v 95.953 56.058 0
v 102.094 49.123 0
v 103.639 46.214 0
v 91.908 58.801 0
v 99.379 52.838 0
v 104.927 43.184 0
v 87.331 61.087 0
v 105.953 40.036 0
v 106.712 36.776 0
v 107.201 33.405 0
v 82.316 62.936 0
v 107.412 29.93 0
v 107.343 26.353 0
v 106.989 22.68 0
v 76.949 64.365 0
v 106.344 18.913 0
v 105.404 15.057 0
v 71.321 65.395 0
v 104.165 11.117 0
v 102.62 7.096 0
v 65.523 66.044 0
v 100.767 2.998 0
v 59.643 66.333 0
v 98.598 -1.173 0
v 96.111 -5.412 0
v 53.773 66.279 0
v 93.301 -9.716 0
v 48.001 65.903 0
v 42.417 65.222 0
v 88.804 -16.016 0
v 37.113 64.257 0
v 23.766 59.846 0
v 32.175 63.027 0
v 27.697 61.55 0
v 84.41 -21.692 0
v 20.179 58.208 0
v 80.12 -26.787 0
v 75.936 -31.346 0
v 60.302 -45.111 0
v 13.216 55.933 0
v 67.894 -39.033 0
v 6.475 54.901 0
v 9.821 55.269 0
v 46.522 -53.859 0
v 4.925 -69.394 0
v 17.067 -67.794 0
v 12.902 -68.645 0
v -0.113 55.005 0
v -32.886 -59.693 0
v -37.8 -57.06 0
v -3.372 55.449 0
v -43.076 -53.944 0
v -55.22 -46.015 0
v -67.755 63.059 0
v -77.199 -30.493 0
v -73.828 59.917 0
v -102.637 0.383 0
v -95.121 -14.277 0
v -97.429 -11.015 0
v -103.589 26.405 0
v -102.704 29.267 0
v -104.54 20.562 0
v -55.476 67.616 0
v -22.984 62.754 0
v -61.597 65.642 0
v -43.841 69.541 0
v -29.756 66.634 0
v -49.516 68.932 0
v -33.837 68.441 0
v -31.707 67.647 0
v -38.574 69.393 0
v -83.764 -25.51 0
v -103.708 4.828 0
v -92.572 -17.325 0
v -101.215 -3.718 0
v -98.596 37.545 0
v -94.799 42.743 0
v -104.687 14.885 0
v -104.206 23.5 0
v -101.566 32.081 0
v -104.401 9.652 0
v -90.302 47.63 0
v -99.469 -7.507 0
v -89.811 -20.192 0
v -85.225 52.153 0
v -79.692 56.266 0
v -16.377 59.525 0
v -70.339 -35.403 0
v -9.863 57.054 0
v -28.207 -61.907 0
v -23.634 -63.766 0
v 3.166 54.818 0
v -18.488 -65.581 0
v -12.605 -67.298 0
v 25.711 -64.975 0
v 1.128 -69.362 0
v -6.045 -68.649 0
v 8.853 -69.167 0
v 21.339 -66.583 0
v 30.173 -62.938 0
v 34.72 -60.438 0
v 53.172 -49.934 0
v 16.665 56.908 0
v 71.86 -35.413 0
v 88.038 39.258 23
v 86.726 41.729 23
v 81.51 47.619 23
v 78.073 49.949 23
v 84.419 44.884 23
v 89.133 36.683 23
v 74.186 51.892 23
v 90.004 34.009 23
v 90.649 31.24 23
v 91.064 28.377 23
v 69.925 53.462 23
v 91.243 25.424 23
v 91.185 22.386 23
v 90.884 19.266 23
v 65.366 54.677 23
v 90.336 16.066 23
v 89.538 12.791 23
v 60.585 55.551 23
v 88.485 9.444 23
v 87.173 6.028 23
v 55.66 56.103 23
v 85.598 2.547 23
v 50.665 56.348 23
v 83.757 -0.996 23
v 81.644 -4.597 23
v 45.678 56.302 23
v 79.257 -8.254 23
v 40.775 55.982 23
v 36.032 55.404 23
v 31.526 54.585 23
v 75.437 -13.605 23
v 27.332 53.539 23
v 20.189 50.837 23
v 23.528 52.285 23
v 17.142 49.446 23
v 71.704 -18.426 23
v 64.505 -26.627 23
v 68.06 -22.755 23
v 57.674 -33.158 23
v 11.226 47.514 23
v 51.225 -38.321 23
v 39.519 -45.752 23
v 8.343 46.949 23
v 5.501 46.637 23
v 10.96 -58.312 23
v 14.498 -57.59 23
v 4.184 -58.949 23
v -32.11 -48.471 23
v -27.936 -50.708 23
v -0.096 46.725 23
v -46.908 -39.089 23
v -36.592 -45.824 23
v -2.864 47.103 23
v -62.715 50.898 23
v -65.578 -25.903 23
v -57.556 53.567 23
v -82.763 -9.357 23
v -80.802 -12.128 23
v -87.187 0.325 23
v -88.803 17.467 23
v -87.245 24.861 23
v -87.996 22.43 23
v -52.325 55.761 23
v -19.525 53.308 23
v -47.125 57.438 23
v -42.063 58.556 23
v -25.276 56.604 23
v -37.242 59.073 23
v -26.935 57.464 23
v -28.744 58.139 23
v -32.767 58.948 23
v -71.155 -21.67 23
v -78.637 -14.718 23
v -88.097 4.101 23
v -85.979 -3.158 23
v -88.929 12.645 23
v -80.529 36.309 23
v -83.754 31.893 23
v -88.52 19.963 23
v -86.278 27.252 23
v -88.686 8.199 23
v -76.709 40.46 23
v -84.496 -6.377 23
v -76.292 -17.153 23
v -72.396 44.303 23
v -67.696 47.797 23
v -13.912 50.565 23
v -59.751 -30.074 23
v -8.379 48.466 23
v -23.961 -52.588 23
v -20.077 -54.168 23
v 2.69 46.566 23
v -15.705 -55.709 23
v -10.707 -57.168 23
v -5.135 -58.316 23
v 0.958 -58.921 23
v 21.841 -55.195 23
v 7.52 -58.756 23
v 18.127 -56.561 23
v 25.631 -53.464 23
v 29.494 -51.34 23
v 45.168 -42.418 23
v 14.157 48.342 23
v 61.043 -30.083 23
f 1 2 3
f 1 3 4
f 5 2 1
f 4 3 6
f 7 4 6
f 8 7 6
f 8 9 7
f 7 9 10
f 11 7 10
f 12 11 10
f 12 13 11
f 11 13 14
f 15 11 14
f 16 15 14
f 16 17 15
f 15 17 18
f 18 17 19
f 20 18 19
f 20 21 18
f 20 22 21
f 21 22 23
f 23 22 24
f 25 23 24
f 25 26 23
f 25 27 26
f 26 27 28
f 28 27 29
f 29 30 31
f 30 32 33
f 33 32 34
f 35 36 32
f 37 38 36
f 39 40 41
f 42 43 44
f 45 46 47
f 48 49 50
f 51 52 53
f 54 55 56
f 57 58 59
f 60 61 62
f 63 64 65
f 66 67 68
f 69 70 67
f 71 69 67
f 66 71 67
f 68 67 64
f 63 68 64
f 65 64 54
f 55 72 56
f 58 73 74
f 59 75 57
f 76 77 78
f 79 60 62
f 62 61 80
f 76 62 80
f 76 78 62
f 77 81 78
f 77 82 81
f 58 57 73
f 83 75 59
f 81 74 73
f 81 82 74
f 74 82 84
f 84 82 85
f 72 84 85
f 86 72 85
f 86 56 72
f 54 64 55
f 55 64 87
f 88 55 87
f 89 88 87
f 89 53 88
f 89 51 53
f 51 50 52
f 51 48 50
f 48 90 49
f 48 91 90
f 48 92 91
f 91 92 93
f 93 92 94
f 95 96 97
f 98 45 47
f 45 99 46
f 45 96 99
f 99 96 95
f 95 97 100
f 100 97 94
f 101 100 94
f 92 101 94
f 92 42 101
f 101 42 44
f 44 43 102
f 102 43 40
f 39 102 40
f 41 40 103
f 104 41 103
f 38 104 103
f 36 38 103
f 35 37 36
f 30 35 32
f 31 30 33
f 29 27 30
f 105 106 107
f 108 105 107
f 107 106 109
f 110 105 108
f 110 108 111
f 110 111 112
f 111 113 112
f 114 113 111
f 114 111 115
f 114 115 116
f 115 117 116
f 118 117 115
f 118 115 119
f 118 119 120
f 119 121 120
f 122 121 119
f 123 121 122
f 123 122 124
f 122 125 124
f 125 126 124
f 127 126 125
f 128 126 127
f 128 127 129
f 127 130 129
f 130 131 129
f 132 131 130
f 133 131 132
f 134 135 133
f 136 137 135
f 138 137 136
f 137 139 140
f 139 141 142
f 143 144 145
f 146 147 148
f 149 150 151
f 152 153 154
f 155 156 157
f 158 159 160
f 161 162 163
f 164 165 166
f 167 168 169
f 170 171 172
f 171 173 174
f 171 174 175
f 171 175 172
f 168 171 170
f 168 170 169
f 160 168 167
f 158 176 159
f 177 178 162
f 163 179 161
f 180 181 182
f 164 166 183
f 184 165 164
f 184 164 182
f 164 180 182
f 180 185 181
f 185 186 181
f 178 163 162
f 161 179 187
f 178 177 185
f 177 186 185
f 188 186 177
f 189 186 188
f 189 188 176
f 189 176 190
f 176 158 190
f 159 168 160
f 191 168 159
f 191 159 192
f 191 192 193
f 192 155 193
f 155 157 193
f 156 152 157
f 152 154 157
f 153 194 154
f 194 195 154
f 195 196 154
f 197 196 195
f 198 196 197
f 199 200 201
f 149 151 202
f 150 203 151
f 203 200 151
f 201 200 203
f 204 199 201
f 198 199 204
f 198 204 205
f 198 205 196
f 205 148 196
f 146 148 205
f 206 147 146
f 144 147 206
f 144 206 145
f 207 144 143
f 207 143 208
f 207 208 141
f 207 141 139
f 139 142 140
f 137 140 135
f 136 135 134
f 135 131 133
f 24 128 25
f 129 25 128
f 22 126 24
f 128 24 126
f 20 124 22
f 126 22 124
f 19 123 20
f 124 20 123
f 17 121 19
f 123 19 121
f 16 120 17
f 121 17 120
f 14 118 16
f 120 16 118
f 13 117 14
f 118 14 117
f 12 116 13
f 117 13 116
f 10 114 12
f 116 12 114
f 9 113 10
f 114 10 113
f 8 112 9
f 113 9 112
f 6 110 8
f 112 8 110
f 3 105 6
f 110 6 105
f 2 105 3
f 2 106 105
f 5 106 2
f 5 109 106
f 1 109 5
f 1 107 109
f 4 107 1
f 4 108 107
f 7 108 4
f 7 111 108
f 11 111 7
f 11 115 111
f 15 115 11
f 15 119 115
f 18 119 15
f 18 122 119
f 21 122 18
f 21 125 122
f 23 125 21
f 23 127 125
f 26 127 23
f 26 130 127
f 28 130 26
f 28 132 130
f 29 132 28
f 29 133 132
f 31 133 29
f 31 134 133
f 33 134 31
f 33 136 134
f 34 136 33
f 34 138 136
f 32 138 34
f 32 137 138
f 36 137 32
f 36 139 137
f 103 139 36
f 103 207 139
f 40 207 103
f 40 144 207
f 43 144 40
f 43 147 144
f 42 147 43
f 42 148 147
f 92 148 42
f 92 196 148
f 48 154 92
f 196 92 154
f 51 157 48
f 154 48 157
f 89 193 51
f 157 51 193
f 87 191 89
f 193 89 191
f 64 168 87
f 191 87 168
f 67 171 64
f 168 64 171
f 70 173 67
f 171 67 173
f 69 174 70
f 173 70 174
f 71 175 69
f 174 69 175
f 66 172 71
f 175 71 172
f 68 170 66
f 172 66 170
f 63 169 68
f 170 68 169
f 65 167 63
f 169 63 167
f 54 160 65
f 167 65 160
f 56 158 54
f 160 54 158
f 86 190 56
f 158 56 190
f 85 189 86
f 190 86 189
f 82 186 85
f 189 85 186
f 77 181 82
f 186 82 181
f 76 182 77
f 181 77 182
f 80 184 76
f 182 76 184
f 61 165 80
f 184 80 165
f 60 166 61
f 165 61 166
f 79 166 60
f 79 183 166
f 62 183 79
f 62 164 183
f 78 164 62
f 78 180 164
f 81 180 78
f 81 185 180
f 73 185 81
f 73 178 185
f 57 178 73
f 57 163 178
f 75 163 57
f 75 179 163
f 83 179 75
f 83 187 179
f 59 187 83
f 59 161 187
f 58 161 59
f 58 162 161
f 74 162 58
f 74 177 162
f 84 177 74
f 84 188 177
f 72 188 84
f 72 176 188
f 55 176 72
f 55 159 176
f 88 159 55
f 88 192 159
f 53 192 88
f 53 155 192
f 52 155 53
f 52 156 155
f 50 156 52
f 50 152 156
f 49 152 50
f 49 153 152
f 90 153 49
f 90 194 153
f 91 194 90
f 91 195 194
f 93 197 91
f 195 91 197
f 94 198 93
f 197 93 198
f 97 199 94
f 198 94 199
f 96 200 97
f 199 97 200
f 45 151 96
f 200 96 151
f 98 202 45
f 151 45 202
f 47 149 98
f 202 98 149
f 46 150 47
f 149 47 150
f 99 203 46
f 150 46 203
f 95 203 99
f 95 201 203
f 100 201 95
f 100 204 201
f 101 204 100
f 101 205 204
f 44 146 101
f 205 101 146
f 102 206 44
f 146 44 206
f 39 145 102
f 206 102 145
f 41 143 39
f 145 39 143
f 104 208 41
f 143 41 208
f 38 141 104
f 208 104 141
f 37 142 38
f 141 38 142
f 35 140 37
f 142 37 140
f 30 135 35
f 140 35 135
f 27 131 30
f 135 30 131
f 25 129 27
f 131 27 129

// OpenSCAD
// file: hillpolygon.scad
module hillFromPolygon(height = 23, angle = 30, convexity = 5) {
   $fn = 100;

   // estRadius calculates an estimated radius for the hill assuming that I've filled most of the
   // depth of the build plate (Y dimension) with the polygon. This is then used to scale the roof of
   // the polyhedral.
   estRadius = 0.95 * 150 / 2;
   inset = height * tan(angle);
   scaleFactor = (estRadius - inset) / estRadius;

   linear_extrude(height = height, convexity = convexity, scale=scaleFactor) child(0);
}
// main file
use <hillpolygon.scad>

% translate([0,0,155/2]) cube(size=[240, 153, 155], center=true); 

hill4();

module hill4() {
   hillFromPolygon(angle=25) hill4Polygon();
}

// Note: There is something slightly amiss with this polygon, resulting hill ends up with two
//       volumes (?).
module hill4Polygon() {
   // Apologies for the hackish adjustments ... just wanted to get the job done!
   translate([-10,0,0]) rotate([0,0,55]) translate([75,-10,0]) scale([0.8,0.8]) 
      polygon(points=
         [[-140.478, 124.045], [-137.230, 125.810], [-133.814, 127.261],
         [-130.249, 128.407], [-126.551, 129.260], [-118.827, 130.135],
         [-110.782, 129.975], [-102.554, 128.873], [-94.282, 126.918],
         [-86.104, 124.202], [-78.161, 120.815], [-70.590, 116.849],
         [-63.530, 112.395], [-57.120, 107.543], [-51.500, 102.384],
         [-46.807, 97.010], [-43.182, 91.511], [-40.761, 85.978], [-40.047,
         83.228], [-39.685, 80.503], [-38.803, 70.788], [-37.372, 61.707],
         [-35.232, 53.266], [-32.221, 45.469], [-30.339, 41.813], [-28.180,
         38.321], [-25.722, 34.993], [-22.947, 31.830], [-19.833, 28.831],
         [-16.361, 25.998], [-12.511, 23.332], [-8.262, 20.833], [-3.699,
         18.030], [1.024, 14.503], [5.824, 10.330], [10.615, 5.590],
         [15.315, 0.361], [19.839, -5.279], [24.103, -11.252], [28.023,
         -17.479], [31.515, -23.882], [34.496, -30.382], [36.880, -36.903],
         [38.583, -43.364], [39.523, -49.689], [39.615, -55.798], [38.774,
         -61.614], [36.917, -67.058], [35.046, -70.725], [32.867, -74.217],
         [30.379, -77.524], [27.585, -80.639], [24.484, -83.556], [21.077,
         -86.264], [17.366, -88.758], [13.350, -91.029], [9.031, -93.069],
         [4.409, -94.871], [-0.514, -96.427], [-5.739, -97.729], [-11.264,
         -98.769], [-17.089, -99.539], [-23.213, -100.032], [-29.635,
         -100.240], [-39.310, -100.153], [-48.272, -99.722], [-56.565,
         -98.983], [-64.233, -97.967], [-71.320, -96.710], [-77.870,
         -95.245], [-89.537, -91.828], [-99.587, -87.986], [-108.374,
         -83.990], [-123.572, -76.623], [-129.392, -73.760], [-134.677,
         -70.651], [-139.458, -67.328], [-143.761, -63.822], [-147.618,
         -60.167], [-151.056, -56.395], [-154.105, -52.536], [-156.794,
         -48.625], [-161.207, -40.769], [-164.527, -33.084], [-166.987,
         -25.828], [-168.818, -19.258], [-170.193, -13.243], [-171.281,
         -6.864], [-172.108, 0.055], [-172.700, 7.691], [-173.288,
         25.811], [-173.262, 48.900], [-173.153, 59.445], [-172.757,
         69.740], [-171.648, 79.745], [-170.692, 84.627], [-169.398,
         89.422], [-167.713, 94.124], [-165.583, 98.729], [-162.955,
         103.233], [-159.776, 107.629], [-155.992, 111.913], [-151.550,
         116.081], [-146.396, 120.126], [-140.478, 124.045]]
      , paths=
         [[0, 1, 2, 3, 4, 5, 6, 7, 8, 9, 10, 11, 12, 13, 14, 15, 16, 17,
         18, 19, 20, 21, 22, 23, 24, 25, 26, 27, 28, 29, 30, 31, 32, 33,
         34, 35, 36, 37, 38, 39, 40, 41, 42, 43, 44, 45, 46, 47, 48, 49,
         50, 51, 52, 53, 54, 55, 56, 57, 58, 59, 60, 61, 62, 63, 64, 65,
         66, 67, 68, 69, 70, 71, 72, 73, 74, 75, 76, 77, 78, 79, 80, 81,
         82, 83, 84, 85, 86, 87, 88, 89, 90, 91, 92, 93, 94, 95, 96, 97,
         98, 99, 100, 101, 102, 103, 104, 0]]
    );}
